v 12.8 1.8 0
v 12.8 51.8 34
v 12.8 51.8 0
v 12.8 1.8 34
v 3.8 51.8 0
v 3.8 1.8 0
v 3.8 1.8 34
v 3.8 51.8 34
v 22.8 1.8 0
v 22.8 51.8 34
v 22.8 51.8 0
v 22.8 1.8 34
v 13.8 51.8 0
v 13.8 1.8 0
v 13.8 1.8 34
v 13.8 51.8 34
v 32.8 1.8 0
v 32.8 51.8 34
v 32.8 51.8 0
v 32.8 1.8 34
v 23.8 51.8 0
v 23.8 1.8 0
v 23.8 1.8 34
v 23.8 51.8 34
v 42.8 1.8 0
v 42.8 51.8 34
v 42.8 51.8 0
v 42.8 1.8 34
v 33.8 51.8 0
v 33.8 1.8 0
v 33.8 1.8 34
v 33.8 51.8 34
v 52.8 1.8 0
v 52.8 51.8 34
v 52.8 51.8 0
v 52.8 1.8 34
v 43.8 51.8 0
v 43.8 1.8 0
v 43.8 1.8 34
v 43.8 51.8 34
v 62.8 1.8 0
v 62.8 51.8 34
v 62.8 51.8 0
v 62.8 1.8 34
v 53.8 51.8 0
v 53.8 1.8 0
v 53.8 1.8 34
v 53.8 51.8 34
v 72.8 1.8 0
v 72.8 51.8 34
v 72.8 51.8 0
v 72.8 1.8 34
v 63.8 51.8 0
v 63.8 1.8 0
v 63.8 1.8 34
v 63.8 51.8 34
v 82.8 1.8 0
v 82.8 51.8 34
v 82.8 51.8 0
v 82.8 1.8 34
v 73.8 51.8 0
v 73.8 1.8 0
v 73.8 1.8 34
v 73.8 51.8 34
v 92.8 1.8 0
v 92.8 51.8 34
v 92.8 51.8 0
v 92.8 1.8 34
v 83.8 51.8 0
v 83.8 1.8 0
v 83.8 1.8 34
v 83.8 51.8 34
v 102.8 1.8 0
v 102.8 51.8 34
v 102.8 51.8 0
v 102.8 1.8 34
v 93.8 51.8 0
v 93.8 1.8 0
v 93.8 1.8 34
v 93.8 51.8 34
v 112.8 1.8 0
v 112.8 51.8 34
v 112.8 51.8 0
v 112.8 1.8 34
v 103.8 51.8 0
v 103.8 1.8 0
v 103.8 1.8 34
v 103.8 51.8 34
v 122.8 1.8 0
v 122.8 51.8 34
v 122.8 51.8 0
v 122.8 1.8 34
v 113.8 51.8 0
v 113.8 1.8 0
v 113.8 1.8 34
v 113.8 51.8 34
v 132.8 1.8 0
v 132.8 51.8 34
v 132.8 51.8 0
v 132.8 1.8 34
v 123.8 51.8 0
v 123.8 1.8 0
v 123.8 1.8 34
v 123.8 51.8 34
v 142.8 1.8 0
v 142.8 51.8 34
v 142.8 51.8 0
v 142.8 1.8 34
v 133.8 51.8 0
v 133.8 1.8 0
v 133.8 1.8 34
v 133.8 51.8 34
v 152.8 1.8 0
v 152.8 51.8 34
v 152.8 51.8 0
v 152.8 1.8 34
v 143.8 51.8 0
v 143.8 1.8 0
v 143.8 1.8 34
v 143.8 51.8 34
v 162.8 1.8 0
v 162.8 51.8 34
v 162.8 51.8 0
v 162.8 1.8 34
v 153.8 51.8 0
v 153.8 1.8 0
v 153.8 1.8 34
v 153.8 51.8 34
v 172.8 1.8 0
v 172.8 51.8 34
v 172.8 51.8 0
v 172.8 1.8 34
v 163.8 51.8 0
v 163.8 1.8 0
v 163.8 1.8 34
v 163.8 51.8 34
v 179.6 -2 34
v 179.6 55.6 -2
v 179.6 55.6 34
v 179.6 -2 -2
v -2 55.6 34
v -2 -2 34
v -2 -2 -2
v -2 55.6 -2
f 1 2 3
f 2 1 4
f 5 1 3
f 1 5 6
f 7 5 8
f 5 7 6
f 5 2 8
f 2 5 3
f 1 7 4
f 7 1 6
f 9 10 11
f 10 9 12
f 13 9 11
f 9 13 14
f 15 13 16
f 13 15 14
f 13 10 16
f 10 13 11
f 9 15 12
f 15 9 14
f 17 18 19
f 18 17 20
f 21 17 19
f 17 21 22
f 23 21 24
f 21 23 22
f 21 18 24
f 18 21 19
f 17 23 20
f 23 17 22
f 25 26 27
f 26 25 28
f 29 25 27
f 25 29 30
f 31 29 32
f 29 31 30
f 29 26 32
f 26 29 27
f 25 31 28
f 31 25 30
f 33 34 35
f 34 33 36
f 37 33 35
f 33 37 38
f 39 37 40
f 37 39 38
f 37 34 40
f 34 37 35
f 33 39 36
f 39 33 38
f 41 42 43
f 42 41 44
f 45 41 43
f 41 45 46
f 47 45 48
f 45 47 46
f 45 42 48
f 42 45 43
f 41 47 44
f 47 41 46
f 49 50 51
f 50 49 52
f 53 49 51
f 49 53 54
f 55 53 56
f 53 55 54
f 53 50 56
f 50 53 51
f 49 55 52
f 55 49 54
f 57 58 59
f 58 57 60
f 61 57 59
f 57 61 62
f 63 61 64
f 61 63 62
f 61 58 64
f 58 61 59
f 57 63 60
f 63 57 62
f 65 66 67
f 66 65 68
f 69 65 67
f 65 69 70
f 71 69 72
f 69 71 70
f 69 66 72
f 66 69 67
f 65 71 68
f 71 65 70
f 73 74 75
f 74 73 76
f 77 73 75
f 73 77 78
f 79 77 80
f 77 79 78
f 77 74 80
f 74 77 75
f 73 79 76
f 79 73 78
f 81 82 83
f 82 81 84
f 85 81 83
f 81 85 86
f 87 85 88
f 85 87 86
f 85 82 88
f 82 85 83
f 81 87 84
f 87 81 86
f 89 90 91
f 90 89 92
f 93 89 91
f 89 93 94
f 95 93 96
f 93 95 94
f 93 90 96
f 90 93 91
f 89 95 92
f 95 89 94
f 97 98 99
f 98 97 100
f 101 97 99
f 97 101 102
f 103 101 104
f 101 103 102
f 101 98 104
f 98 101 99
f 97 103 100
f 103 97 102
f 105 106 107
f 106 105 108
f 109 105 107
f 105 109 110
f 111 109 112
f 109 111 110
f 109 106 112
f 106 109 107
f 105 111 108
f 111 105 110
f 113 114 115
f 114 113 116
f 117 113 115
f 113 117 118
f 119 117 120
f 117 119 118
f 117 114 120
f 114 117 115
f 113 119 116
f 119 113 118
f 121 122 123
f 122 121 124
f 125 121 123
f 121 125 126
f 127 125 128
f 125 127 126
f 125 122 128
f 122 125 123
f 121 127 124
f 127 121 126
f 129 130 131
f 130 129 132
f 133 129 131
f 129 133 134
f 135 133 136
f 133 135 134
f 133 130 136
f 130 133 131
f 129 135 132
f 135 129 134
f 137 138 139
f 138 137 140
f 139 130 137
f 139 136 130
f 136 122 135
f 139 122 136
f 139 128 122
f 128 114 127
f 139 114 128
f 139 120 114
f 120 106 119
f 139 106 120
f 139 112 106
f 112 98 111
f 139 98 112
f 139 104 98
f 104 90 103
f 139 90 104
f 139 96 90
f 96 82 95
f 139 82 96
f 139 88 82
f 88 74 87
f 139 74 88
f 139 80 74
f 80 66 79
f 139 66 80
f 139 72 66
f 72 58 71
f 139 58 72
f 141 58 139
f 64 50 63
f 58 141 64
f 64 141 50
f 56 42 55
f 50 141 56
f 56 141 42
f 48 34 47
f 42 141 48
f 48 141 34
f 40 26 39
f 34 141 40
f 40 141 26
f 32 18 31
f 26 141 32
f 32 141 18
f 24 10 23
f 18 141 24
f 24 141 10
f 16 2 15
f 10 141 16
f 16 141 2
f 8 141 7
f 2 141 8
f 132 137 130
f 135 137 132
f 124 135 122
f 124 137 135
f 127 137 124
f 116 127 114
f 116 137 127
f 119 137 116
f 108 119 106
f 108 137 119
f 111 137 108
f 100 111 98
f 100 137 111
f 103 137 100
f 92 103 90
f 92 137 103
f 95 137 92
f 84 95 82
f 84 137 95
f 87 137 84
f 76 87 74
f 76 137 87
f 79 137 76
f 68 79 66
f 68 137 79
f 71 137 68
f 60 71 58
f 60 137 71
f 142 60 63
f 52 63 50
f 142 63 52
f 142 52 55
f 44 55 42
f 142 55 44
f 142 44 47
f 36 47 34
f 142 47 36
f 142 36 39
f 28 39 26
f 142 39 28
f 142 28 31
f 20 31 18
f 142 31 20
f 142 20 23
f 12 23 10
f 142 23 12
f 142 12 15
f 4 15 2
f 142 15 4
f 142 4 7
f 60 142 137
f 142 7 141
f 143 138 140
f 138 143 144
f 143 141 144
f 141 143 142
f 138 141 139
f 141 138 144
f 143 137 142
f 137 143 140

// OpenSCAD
//
// ktRACK64
//
//

gap1 = 0.002;
gap2 = 0.004;
th = 2;

X=96-1;
Y=486/3;
Z=15;
F1=35-1;
F2=8-1;

AAR=14+0.8;
AAH=51;
AAX=10;
AAY=2;

AAAR=10.2+0.8;
AAAH=AAH;//45;
AAAX=10;
AAAY=2;


AAXA=12;
AAYA=2;
AAAXA=16;
AAAYA=2;

//futa(AAAR, AAAH, AAAX, AAAY);
//case(AAAR, AAAH, AAAX, AAAY);
//futa(AAR, AAH, AAX, AAY);
//case(AAR, AAH, AAX, AAY);

//futaALL();
//caseALL();

caseB();


module caseB()
{
difference()
{
    union()
    {
        translate([-th, -th, -th]) cube([th+AAR*AAXA+th, th+AAR*AAYA+th+AAAR*AAAYA+th, AAH/3*2+th]);
    }

    translate([((AAR*AAXA)-((9+1)*(16+1)))/2, ((AAR*AAYA+th+AAAR*AAAYA)-50)/2, 0])
    {
    for (x=[0:16])
    {
        #translate([(9+1)*x, 0, 0]) cube([9, 50, 95]);
    }
    }

}
}



module caseALL()
{
difference()
{
    union()
    {
        translate([-th, -th, -th]) cube([th+AAR*AAXA+th, th+AAR*AAYA+th+AAAR*AAAYA+th, AAH/3*2+th]);
    }

    translate([AAR/2-th, AAR/2-th, 0]) cube([AAR*(AAXA-1)+th*2, AAR*(AAYA-1)+th*2, AAH/3*2+gap1]);
    translate([AAR/2, AAR/2, 0])
    {
    for (x=[0:AAXA-1])
    {
        for (y=[0:AAYA-1])
        {
            translate([AAR*x, AAR*y, 0]) cylinder(h=AAH, r=AAR/2, $fn=100);
        }
    }
    }

    translate([AAAR/2+(AAR*AAXA-AAAR*AAAXA)/2-th, AAAR/2+th+AAR*AAYA-th, 0]) cube([AAAR*(AAAXA-1)+th*2, AAAR*(AAAYA-1)+th*2, AAAH/3*2+gap1]);
    translate([AAAR/2+(AAR*AAXA-AAAR*AAAXA)/2, AAAR/2+th+AAR*AAYA, 0])
    {
    for (x=[0:AAAXA-1])
    {
        for (y=[0:AAAYA-1])
        {
            translate([AAAR*x, AAAR*y, 0]) cylinder(h=AAAH, r=AAAR/2, $fn=100);
        }
    }
    }
}
}
module futaALL()
{
difference()
{
    union()
    {
        translate([-th, -th, AAH/3*2]) cube([th+AAR*AAXA+th, th+AAR*AAYA+th+AAAR*AAAYA+th, AAH/3*1+th]);
    }

    translate([AAR/2-th, AAR/2-th, AAH/3*2-gap1]) cube([AAR*(AAXA-1)+th*2, AAR*(AAYA-1)+th*2, AAH/3*1]);
    translate([AAR/2, AAR/2, 0])
    {
    for (x=[0:AAXA-1])
    {
        for (y=[0:AAYA-1])
        {
            translate([AAR*x, AAR*y, 0]) cylinder(h=AAH, r=AAR/2, $fn=100);
        }
    }
    }

    translate([AAAR/2+(AAR*AAXA-AAAR*AAAXA)/2-th, AAAR/2+th+AAR*AAYA-th, AAH/3*2-gap1]) cube([AAAR*(AAAXA-1)+th*2, AAAR*(AAAYA-1)+th*2, AAAH/3*1]);
    translate([AAAR/2+(AAR*AAXA-AAAR*AAAXA)/2, AAAR/2+th+AAR*AAYA, 0])
    {
    for (x=[0:AAAXA-1])
    {
        for (y=[0:AAAYA-1])
        {
            translate([AAAR*x, AAAR*y, 0]) cylinder(h=AAAH, r=AAAR/2, $fn=100);
        }
    }
    }
}
}









module case(_R, _H, _X, _Y)
{
difference()
{
    union()
    {
        translate([-th-_R/2, -th-_R/2, -th]) cube([_R*_X+th*2, _R*_Y+th*2, _H/3*2+th]);
    }
    translate([-th, -th, 0]) cube([_R*(_X-1)+th*2, _R*(_Y-1)+th*2, _H/3*2+gap1]);
    
    for (x=[0:_X-1])
    {
        for (y=[0:_Y-1])
        {
            translate([_R*x, _R*y, 0]) cylinder(h=_H, r=_R/2, $fn=100);
        }
    }
}
}



module futa(_R, _H, _X, _Y)
{
difference()
{
    union()
    {
        translate([-th-_R/2, -th-_R/2, _H/3*2]) cube([_R*_X+th*2, _R*_Y+th*2, _H/3*1+th]);
    }
    translate([-th, -th, _H/3*2-gap1]) cube([_R*(_X-1)+th*2, _R*(_Y-1)+th*2, _H/3*1]);
    
    for (x=[0:_X-1])
    {
        for (y=[0:_Y-1])
        {
            translate([_R*x, _R*y, 0]) cylinder(h=_H, r=_R/2, $fn=100);
        }
    }
}
}
